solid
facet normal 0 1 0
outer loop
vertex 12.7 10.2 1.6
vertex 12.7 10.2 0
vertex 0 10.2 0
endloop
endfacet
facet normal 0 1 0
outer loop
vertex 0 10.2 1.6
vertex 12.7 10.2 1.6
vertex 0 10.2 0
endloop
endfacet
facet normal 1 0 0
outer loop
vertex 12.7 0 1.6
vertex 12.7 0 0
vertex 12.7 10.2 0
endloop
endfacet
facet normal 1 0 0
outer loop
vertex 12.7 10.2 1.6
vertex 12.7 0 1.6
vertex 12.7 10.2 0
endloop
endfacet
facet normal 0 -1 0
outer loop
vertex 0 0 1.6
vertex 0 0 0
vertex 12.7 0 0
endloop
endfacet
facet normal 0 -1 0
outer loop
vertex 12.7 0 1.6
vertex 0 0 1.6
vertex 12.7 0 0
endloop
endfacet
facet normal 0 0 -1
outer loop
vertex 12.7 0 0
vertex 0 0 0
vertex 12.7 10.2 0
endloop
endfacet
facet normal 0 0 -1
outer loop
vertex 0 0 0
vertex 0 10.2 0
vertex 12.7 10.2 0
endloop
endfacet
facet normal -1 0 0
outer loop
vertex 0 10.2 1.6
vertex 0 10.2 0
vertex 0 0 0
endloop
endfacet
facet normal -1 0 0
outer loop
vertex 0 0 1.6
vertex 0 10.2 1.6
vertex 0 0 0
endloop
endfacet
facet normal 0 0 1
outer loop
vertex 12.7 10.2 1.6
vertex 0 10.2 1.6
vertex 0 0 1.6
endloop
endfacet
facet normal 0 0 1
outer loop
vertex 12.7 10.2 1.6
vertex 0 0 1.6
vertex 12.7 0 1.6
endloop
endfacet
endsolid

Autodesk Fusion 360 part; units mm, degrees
sketch "Szkic1" plane through (0, 0, 0) normal (0, 0, 1) x (1, 0, 0)
  line L0 (0, 0) -> (12.7, 0)
  line L1 (12.7, 0) -> (12.7, 10.2)
  line L2 (12.7, 10.2) -> (0, 10.2)
  line L3 (0, 10.2) -> (0, 0)
  dimension "d1" = 12.7
  dimension "d2" = 10.2
extrude "Wyciągnięcie proste1" add sketch "Szkic1" along normal blind 1.6 makes body 1
copy_body "Bryła->Komponent1" bodies 1 removing the originals makes body 2 in component "Component"
component "Component" placed x (1, 0, 0) y (0, 1, 0) z (0, 0, 1) at (0, 0, 0)
